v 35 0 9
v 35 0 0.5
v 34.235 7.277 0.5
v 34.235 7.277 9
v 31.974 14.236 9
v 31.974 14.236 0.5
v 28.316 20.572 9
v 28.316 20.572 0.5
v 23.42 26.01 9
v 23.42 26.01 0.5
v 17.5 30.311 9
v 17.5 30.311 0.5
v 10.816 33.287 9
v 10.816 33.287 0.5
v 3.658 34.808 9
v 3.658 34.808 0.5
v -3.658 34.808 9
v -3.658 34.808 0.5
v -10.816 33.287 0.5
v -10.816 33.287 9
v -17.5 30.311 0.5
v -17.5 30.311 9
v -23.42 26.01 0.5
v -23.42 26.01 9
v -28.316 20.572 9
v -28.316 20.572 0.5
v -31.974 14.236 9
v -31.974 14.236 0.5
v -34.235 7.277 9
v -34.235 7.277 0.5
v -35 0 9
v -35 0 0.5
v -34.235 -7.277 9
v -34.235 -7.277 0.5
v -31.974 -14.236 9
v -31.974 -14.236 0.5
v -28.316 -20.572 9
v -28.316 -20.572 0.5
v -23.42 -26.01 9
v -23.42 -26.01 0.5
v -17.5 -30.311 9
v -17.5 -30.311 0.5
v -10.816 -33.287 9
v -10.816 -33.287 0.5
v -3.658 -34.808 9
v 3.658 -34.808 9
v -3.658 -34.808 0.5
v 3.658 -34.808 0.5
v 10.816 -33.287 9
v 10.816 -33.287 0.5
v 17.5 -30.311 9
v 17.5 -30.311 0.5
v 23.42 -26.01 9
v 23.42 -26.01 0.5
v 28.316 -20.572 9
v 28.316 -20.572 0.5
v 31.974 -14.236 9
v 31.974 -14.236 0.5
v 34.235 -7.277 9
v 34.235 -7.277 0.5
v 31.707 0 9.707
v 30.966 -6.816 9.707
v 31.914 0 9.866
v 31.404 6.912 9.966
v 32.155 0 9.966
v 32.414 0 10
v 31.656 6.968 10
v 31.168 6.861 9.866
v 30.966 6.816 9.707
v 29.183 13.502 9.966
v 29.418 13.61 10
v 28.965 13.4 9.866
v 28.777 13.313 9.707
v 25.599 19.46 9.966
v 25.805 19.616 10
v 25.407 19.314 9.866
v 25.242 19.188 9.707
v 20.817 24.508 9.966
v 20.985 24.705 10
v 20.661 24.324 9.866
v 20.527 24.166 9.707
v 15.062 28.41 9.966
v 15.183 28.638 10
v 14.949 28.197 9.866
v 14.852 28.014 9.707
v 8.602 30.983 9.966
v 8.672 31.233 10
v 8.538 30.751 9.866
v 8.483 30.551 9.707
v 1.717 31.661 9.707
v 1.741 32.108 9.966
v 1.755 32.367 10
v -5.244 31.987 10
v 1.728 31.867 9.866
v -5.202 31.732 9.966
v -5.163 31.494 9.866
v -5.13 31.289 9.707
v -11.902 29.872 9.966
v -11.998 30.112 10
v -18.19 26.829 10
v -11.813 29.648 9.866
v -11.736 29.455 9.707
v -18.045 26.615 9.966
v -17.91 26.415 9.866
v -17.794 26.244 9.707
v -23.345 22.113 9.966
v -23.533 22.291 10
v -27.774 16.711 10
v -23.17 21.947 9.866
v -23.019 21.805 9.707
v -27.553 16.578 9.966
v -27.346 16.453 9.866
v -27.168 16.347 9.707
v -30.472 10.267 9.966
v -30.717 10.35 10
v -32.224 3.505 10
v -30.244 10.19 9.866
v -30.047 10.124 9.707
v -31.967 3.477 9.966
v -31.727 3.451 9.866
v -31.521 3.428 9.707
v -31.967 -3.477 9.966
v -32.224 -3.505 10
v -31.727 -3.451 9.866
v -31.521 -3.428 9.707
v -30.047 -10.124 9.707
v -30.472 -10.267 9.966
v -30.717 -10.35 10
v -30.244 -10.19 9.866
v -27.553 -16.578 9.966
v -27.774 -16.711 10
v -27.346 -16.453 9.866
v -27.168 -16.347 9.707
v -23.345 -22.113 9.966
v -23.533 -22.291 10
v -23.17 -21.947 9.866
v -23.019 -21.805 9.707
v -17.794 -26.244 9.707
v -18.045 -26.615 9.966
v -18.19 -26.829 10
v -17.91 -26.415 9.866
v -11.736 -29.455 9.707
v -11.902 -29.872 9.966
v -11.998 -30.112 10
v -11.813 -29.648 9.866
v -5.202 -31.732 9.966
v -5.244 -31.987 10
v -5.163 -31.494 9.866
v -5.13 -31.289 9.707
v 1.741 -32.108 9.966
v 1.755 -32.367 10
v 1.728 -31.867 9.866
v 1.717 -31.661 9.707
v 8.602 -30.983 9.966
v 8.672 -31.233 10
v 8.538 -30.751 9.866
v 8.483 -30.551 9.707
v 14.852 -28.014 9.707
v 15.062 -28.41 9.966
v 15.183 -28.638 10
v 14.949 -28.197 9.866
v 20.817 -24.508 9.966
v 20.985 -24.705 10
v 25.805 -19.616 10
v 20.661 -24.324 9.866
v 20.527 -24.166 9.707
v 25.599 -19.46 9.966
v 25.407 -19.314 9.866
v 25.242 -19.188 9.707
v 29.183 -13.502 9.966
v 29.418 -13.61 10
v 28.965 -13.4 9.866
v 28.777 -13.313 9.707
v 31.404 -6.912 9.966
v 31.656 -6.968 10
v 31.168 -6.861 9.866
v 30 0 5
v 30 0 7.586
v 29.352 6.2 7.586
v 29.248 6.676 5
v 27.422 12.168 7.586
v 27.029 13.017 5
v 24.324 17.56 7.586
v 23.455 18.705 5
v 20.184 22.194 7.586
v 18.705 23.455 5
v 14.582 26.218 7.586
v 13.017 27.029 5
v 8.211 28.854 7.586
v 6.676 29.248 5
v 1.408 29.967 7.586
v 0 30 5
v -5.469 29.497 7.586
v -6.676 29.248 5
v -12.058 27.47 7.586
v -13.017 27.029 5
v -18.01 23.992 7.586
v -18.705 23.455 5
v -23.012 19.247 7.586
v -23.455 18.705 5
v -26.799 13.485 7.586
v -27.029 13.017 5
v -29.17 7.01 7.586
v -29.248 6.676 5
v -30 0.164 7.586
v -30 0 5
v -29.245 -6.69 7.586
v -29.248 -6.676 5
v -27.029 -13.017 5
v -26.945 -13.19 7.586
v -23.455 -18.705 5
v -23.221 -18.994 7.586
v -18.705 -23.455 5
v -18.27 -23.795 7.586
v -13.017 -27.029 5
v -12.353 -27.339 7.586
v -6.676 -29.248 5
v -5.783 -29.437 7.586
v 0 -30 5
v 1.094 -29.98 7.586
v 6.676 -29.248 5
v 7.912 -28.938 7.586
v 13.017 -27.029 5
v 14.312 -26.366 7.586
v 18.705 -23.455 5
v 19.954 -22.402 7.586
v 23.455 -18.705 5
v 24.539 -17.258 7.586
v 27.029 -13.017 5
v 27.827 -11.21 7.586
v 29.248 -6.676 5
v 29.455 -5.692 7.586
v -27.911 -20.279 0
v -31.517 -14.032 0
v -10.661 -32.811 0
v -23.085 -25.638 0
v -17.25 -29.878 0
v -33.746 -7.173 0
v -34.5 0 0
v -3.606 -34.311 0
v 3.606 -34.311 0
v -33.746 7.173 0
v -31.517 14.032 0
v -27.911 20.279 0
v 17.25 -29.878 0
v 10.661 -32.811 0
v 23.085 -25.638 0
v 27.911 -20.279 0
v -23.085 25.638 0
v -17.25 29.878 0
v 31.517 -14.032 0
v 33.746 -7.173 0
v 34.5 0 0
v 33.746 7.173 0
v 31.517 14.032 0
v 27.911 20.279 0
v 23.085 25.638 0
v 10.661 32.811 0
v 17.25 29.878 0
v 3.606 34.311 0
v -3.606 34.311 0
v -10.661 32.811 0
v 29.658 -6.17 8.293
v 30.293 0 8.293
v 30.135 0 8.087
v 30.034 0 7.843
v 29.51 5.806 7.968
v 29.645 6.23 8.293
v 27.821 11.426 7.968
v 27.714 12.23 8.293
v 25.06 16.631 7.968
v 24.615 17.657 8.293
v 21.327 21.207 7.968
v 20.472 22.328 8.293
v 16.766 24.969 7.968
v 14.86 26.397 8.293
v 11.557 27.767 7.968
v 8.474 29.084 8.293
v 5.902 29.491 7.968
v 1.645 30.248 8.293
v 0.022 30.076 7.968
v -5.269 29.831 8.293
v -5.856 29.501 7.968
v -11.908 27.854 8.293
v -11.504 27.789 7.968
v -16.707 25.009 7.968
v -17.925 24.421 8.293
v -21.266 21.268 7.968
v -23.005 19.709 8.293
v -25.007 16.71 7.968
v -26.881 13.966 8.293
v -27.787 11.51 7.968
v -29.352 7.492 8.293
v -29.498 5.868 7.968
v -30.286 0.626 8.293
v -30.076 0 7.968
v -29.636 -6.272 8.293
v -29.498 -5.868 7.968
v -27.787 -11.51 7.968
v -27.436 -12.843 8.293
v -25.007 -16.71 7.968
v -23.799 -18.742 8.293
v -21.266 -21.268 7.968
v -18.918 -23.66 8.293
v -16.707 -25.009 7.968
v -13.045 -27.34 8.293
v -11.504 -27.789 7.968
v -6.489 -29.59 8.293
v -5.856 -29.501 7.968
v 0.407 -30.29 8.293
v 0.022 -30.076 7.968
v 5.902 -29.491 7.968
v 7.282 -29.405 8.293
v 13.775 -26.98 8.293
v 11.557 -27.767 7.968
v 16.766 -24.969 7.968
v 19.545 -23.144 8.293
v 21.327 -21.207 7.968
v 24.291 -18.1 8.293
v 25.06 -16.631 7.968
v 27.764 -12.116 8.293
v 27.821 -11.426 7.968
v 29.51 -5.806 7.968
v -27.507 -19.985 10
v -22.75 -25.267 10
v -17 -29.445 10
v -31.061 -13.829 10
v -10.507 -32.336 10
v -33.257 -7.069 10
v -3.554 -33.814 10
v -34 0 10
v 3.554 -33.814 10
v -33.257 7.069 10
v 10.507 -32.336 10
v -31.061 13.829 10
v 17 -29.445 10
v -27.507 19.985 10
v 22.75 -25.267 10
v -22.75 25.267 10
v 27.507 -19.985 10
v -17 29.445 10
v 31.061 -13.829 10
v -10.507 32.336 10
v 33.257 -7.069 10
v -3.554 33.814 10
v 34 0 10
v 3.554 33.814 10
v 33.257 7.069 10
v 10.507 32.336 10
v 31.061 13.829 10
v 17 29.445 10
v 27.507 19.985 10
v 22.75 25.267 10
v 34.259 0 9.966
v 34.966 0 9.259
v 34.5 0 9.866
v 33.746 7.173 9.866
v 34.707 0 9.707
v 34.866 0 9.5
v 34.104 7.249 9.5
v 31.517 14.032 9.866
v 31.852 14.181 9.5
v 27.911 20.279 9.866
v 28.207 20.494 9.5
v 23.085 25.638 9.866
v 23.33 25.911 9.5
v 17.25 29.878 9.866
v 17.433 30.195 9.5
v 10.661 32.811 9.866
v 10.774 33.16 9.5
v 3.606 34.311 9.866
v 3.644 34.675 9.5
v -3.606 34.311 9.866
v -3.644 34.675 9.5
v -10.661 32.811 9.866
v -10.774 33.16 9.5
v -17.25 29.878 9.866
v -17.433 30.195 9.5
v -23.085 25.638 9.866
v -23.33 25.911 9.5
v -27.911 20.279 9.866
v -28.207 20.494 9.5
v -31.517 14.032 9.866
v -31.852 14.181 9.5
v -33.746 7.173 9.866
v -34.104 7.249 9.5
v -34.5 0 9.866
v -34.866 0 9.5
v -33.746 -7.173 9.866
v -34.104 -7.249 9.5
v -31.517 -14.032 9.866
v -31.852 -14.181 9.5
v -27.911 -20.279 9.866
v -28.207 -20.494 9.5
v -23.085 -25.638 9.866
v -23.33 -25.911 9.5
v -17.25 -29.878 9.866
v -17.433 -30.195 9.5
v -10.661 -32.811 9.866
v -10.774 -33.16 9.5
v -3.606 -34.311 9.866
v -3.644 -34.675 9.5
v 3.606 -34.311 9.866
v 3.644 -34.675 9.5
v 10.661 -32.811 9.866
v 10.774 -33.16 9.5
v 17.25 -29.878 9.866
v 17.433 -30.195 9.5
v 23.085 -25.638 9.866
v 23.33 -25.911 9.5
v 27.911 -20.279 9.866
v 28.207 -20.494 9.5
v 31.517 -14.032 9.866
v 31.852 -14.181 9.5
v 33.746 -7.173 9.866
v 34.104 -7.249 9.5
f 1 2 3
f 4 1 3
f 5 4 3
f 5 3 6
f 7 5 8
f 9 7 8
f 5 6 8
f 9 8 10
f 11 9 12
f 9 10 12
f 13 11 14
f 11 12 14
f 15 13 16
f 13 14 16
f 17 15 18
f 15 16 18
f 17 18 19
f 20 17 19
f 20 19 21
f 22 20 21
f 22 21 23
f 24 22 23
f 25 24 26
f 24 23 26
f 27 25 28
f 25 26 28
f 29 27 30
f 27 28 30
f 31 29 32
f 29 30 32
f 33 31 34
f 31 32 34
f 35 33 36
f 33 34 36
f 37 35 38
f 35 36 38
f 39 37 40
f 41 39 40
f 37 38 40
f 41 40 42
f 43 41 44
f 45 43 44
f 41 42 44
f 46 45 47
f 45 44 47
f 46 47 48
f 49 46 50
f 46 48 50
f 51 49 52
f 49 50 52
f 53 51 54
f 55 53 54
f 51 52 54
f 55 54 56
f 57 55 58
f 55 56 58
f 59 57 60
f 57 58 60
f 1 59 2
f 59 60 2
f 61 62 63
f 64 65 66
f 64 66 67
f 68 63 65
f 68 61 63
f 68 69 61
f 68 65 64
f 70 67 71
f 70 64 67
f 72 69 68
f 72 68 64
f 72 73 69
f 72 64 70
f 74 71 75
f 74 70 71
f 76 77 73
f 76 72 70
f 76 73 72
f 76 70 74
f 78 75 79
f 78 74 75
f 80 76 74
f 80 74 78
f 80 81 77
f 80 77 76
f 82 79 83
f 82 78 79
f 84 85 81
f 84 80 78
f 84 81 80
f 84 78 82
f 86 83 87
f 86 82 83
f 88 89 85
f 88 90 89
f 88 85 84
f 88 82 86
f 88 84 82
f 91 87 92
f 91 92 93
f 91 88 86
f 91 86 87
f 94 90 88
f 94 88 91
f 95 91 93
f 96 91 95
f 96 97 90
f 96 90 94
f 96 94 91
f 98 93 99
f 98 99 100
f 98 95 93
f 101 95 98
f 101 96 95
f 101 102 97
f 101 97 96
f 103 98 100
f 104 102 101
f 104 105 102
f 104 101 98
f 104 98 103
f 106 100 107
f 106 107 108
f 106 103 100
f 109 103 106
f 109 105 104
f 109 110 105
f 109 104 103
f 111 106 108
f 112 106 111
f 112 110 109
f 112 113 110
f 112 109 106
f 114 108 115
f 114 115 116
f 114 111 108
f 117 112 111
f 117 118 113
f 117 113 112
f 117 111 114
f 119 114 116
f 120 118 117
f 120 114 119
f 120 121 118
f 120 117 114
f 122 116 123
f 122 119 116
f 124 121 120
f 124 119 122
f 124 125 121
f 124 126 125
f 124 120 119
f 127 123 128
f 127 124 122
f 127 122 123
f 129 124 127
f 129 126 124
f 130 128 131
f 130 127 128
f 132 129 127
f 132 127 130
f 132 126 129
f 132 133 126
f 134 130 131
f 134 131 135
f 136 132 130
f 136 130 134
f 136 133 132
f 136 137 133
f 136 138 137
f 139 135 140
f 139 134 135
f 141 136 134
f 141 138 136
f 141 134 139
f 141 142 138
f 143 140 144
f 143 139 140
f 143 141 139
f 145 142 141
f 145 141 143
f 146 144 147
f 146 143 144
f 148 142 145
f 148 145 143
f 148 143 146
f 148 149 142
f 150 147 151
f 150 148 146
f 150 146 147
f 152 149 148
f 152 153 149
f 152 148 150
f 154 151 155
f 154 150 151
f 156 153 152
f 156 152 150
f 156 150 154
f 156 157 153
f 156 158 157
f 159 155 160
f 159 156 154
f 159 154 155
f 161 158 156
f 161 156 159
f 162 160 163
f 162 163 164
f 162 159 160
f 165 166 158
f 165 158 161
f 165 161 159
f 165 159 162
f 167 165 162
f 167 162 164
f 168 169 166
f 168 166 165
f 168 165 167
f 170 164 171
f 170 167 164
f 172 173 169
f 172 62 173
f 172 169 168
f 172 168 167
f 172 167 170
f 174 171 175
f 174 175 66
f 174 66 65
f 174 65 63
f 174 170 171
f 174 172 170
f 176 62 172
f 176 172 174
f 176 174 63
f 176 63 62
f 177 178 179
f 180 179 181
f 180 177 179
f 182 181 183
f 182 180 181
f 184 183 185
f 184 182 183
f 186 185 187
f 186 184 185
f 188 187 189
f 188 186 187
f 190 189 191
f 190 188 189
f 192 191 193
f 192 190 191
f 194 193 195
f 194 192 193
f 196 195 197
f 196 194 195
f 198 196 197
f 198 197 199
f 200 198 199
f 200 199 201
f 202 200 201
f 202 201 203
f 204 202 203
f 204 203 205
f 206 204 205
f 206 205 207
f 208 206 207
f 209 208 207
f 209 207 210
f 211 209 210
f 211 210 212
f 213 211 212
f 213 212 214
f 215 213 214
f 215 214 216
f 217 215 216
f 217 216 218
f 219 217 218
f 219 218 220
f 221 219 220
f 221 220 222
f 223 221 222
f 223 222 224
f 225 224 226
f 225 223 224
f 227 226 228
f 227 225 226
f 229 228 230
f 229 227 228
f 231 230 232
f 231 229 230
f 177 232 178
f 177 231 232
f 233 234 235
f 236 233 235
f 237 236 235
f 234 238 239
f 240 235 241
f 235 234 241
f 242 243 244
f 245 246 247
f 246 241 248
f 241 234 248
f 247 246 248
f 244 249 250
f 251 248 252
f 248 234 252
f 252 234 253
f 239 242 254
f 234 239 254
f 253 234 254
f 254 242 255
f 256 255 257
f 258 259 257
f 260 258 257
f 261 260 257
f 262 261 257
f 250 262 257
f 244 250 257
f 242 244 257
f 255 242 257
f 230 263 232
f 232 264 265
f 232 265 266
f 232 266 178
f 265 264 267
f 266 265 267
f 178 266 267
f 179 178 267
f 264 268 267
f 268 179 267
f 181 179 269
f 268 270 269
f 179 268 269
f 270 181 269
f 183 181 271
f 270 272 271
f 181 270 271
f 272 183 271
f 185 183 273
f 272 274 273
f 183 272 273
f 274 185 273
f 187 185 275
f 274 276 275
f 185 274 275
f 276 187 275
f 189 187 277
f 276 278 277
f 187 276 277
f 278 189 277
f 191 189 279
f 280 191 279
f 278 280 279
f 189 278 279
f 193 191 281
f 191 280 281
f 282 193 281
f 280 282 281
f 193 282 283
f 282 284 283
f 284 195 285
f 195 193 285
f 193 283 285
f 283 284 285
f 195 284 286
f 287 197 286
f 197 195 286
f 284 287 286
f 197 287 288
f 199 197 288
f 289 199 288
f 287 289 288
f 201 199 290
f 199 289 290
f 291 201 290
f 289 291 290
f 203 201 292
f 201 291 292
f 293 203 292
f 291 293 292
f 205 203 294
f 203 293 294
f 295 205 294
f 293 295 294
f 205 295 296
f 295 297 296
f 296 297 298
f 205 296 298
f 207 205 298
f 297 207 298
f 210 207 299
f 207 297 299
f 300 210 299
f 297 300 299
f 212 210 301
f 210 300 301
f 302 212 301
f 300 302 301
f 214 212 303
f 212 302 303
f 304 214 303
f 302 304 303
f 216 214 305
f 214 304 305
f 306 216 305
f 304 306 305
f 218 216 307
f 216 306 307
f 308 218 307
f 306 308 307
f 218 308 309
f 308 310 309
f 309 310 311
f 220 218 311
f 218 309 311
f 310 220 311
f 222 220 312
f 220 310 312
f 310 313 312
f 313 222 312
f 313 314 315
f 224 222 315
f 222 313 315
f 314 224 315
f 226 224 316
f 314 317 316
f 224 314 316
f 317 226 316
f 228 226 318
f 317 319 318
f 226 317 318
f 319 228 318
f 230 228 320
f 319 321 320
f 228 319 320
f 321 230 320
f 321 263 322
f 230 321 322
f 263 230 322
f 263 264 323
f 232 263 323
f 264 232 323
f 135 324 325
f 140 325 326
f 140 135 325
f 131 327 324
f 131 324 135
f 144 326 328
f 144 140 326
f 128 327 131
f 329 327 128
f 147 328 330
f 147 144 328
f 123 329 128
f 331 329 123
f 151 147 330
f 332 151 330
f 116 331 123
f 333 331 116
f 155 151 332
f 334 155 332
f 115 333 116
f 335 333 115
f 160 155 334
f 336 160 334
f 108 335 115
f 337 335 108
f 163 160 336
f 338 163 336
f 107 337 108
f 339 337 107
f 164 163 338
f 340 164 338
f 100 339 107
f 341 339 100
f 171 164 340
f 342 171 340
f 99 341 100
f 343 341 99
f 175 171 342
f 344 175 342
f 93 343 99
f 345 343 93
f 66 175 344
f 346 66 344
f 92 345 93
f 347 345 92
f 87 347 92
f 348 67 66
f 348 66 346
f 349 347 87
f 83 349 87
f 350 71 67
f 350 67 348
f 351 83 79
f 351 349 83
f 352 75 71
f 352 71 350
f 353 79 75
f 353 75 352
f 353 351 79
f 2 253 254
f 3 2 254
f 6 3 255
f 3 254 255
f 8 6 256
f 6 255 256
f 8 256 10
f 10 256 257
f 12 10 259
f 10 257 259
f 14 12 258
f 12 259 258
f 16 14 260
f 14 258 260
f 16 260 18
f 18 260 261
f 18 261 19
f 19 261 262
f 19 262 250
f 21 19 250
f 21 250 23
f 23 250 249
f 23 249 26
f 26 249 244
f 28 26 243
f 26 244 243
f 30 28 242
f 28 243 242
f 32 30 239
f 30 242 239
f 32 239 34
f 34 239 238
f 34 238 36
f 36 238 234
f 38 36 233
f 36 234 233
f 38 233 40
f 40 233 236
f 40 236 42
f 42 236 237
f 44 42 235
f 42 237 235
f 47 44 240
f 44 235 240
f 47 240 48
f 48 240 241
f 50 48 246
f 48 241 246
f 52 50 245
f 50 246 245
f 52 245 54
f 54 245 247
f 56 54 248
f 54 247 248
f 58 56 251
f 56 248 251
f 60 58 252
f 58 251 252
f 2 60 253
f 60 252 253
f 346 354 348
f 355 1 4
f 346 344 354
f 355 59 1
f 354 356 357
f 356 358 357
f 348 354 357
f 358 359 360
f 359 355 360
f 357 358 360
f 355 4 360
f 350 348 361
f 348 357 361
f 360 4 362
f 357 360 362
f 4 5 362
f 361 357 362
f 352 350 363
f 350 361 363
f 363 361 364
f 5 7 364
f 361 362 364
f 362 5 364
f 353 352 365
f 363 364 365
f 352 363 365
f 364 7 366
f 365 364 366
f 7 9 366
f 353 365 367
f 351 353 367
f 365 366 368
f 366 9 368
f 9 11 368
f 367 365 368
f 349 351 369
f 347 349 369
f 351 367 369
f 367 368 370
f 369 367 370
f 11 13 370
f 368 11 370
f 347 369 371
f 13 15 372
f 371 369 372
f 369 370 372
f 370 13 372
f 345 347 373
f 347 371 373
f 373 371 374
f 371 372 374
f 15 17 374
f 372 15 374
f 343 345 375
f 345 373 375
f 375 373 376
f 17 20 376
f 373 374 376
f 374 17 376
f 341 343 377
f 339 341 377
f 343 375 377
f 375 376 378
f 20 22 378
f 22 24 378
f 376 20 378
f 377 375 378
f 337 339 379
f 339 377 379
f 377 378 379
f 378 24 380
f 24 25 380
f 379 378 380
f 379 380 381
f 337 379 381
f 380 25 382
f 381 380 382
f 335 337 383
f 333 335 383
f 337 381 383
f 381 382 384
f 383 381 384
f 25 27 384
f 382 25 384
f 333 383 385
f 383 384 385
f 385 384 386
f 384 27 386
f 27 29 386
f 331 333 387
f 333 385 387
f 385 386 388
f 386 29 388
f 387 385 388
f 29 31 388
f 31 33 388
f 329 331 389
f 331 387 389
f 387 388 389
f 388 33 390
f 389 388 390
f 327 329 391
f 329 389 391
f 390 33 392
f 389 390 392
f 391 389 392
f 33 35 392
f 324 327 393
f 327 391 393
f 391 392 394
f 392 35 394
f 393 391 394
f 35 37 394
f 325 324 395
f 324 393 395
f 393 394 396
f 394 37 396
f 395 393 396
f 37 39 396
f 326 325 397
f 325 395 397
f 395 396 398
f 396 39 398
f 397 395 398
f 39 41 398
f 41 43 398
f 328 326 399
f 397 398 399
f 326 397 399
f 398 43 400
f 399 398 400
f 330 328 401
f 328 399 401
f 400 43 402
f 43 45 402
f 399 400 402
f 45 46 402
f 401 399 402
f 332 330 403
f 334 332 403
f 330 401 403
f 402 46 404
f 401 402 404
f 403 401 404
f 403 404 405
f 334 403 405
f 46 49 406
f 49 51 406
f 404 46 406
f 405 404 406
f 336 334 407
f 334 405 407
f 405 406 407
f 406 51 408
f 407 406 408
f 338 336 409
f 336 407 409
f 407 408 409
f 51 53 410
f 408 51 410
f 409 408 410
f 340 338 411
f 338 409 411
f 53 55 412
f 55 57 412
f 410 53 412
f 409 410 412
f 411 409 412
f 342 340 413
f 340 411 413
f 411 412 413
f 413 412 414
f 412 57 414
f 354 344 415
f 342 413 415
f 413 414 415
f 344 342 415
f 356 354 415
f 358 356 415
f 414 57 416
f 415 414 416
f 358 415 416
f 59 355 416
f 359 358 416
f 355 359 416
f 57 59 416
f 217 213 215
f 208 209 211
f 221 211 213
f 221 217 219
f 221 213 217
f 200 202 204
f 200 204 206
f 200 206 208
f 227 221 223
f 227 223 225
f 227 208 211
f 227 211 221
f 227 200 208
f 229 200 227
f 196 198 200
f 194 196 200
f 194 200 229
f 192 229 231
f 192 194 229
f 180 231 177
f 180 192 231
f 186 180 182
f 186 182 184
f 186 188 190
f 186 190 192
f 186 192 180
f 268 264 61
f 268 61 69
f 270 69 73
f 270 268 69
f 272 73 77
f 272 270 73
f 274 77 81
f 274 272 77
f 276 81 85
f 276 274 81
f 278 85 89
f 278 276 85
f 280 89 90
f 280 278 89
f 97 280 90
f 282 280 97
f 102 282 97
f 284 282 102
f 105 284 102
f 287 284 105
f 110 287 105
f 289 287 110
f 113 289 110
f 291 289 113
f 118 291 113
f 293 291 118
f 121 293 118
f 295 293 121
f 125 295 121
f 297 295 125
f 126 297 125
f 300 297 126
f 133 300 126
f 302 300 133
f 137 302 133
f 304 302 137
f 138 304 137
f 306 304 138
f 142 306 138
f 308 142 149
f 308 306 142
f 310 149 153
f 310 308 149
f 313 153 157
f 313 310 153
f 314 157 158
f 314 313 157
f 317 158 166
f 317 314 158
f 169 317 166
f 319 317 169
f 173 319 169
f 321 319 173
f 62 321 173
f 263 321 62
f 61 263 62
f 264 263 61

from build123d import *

# Parameters (mm, degrees)
F0_R     = 30
F1_DEPTH = 5
F0_R_2   = 35
F2_DEPTH = 10
F3_SIZE  = 2
F4_R     = 1
F5_SIZE  = 0.5


with BuildPart() as f1:
    # F0 (on Top) → F1 (new body)
    with BuildSketch(Plane.XY):
        Circle(F0_R)
    extrude(amount=F1_DEPTH)

    # F0 (on Top) → F2 (join)
    with BuildSketch(Plane.XY):
        Circle(F0_R_2)
        Circle(F0_R, mode=Mode.SUBTRACT)
    extrude(amount=F2_DEPTH)

    # F3
    f3_edges = [f1.edges().sort_by_distance(p)[0] for p in [
        (-30, 0, 10),
    ]]
    chamfer(f3_edges, length=F3_SIZE)

    # F4
    f4_edges = [f1.edges().sort_by_distance(p)[0] for p in [
        (-30, 0, 8),
        (-32, 0, 10),
        (-35, 0, 10),
    ]]
    fillet(f4_edges, radius=F4_R)

    # F5
    f5_edges = [f1.edges().sort_by_distance(p)[0] for p in [
        (-35, 0, 0),
    ]]
    chamfer(f5_edges, length=F5_SIZE)


solid = f1.part
